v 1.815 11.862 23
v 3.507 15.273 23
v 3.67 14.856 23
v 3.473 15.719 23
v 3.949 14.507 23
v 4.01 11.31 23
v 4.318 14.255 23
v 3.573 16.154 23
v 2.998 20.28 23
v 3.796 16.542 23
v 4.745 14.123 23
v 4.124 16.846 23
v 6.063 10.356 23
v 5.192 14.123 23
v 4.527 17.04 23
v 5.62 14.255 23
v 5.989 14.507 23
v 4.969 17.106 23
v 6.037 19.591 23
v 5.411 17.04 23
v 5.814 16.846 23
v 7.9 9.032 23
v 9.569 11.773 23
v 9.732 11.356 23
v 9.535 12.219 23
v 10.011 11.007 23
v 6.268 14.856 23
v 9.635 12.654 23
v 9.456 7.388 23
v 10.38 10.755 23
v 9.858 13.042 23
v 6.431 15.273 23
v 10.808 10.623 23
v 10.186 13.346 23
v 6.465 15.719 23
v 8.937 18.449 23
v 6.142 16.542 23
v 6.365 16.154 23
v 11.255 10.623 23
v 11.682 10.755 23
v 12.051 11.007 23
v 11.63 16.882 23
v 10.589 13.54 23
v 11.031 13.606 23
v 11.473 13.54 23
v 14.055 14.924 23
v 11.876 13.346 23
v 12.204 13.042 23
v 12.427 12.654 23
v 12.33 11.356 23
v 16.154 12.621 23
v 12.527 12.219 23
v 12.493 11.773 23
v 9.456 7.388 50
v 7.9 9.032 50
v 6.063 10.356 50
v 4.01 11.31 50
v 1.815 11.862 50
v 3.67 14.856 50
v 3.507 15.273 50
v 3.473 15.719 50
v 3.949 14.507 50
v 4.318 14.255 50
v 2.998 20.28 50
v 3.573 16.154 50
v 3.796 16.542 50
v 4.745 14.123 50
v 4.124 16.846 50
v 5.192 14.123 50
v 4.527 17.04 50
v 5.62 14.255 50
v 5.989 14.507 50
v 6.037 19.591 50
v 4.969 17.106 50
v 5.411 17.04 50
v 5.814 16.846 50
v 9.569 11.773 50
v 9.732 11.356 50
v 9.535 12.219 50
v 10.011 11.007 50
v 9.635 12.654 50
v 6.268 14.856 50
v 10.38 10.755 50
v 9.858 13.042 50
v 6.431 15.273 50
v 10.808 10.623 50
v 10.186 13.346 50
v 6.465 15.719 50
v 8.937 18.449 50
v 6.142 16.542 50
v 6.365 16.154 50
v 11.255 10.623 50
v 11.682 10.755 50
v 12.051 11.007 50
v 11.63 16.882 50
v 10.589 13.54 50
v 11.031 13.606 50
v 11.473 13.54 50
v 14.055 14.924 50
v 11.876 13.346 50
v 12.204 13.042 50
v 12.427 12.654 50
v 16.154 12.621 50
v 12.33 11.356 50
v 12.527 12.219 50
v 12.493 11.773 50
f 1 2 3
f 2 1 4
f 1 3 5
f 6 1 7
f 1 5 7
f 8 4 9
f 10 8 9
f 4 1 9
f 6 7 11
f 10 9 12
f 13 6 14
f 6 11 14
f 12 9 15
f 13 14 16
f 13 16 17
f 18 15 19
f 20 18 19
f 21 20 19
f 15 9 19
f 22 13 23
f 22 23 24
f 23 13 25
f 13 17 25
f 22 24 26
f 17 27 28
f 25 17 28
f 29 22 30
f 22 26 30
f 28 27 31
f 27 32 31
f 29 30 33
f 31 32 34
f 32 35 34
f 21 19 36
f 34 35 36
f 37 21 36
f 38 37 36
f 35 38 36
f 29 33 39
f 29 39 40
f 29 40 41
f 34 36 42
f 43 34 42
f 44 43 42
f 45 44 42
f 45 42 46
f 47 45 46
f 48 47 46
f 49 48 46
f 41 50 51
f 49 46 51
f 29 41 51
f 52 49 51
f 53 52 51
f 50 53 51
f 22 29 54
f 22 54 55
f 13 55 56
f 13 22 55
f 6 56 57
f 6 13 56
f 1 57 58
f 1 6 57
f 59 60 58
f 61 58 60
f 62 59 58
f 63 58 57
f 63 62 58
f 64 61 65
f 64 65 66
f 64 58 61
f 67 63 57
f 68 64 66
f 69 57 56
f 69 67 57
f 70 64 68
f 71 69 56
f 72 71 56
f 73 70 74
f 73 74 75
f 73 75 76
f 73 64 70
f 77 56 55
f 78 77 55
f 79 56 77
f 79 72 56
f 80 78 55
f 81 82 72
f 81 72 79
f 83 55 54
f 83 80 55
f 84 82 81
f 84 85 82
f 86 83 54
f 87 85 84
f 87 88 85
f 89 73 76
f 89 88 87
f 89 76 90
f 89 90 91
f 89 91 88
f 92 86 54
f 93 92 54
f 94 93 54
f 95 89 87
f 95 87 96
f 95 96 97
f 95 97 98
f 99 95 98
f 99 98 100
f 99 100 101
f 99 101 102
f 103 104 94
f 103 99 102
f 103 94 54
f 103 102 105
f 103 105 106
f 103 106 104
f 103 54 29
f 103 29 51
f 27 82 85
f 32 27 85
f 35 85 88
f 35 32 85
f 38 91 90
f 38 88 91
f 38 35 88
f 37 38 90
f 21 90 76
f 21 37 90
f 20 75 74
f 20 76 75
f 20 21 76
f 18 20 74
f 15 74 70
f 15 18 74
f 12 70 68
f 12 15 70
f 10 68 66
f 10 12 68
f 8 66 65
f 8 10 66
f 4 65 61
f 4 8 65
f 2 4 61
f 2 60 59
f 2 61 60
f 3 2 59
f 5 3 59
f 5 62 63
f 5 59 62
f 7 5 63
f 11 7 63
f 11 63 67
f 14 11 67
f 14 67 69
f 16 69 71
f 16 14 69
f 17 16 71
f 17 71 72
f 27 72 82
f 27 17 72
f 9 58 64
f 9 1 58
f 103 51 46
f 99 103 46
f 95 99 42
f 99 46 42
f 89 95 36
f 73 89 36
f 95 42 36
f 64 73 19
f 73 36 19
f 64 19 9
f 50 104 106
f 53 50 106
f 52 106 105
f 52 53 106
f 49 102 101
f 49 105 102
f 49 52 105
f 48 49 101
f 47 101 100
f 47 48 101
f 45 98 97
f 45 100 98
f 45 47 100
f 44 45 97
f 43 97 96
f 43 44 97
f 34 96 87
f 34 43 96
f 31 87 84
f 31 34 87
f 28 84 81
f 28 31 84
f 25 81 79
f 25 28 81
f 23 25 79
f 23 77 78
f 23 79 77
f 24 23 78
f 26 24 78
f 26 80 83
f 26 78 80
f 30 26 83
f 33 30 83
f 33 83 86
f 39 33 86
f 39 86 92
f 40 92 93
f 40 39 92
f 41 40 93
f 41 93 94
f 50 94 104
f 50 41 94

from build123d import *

# Parameters (mm, degrees)
CYLINDER860_R          = 1.5
CYLINDER860_DEPTH      = 60
CYLINDER859_R          = 1.5
CYLINDER859_DEPTH      = 60
BOX336_W               = 20
BOX336_H               = 40
BOX336_DEPTH           = 60
BOX336_PLACEMENT_ANGLE = 22
BOX410_W               = 20
BOX410_H               = 40
BOX410_DEPTH           = 60
BOX410_PLACEMENT_ANGLE = 22
BOX335_W               = 60
BOX335_H               = 40
BOX335_DEPTH           = 60
TUBE037_R              = 20.5
TUBE037_R_2            = 12
TUBE037_DEPTH          = 27
CUT468_PLACEMENT_ANGLE = 30


with BuildPart() as v_lec860:
    # Cylinder860 → Cylinder860 (new body)
    with BuildSketch(Plane(origin=(-3.5, 16, 0), x_dir=(1, 0, 0), z_dir=(0, 0, 1))):
        Circle(CYLINDER860_R)
    extrude(amount=CYLINDER860_DEPTH)


with BuildPart() as compound565:
    # Cylinder859 → Cylinder859 (new body)
    with BuildSketch(Plane(origin=(3.5, 16, 0), x_dir=(1, 0, 0), z_dir=(0, 0, 1))):
        Circle(CYLINDER859_R)
    extrude(amount=CYLINDER859_DEPTH)

    # Compound565: union Válec860
    add(v_lec860.part)


with BuildPart() as krychle336:
    # Box336 → Box336 (new body)
    with BuildSketch(Plane.XY):
        with Locations((10, 20)):
            Rectangle(BOX336_W, BOX336_H)
    extrude(amount=BOX336_DEPTH)


with BuildPart() as krychle336_1:
    # Box336 placement: moved
    add(krychle336.part.rotate(Axis((0, 0, 0), (0, 0, -1)), BOX336_PLACEMENT_ANGLE))


with BuildPart() as krychle410:
    # Box410 → Box410 (new body)
    with BuildSketch(Plane.XY):
        with Locations((10, 20)):
            Rectangle(BOX410_W, BOX410_H)
    extrude(amount=BOX410_DEPTH)


with BuildPart() as krychle410_1:
    # Box410 placement: moved
    add(krychle410.part.moved(Location((-19.32, -5.18, 0))).rotate(Axis((-19.32, -5.18, 0), (0, 0, 1)), BOX410_PLACEMENT_ANGLE))


with BuildPart() as krychle335:
    # Box335 → Box335 (new body)
    with BuildSketch(Plane(origin=(-30, -35, 0), x_dir=(1, 0, 0), z_dir=(0, 0, 1))):
        with Locations((30, 20)):
            Rectangle(BOX335_W, BOX335_H)
    extrude(amount=BOX335_DEPTH)


with BuildPart() as cut468:
    # Tube037 → Tube037 (new body)
    with BuildSketch(Plane.XY.offset(23)):
        Circle(TUBE037_R)
        Circle(TUBE037_R_2, mode=Mode.SUBTRACT)
    extrude(amount=TUBE037_DEPTH)

    # Cut355: cut Krychle335
    add(krychle335.part, mode=Mode.SUBTRACT)

    # Cut357: cut Krychle410
    add(krychle410_1.part, mode=Mode.SUBTRACT)

    # Cut358: cut Krychle336
    add(krychle336_1.part, mode=Mode.SUBTRACT)

    # Cut468: cut Compound565
    add(compound565.part, mode=Mode.SUBTRACT)


with BuildPart() as cut468_1:
    # Cut468 placement: moved
    add(cut468.part.rotate(Axis((0, 0, 0), (0, 0, -1)), CUT468_PLACEMENT_ANGLE))


solid = cut468_1.part
